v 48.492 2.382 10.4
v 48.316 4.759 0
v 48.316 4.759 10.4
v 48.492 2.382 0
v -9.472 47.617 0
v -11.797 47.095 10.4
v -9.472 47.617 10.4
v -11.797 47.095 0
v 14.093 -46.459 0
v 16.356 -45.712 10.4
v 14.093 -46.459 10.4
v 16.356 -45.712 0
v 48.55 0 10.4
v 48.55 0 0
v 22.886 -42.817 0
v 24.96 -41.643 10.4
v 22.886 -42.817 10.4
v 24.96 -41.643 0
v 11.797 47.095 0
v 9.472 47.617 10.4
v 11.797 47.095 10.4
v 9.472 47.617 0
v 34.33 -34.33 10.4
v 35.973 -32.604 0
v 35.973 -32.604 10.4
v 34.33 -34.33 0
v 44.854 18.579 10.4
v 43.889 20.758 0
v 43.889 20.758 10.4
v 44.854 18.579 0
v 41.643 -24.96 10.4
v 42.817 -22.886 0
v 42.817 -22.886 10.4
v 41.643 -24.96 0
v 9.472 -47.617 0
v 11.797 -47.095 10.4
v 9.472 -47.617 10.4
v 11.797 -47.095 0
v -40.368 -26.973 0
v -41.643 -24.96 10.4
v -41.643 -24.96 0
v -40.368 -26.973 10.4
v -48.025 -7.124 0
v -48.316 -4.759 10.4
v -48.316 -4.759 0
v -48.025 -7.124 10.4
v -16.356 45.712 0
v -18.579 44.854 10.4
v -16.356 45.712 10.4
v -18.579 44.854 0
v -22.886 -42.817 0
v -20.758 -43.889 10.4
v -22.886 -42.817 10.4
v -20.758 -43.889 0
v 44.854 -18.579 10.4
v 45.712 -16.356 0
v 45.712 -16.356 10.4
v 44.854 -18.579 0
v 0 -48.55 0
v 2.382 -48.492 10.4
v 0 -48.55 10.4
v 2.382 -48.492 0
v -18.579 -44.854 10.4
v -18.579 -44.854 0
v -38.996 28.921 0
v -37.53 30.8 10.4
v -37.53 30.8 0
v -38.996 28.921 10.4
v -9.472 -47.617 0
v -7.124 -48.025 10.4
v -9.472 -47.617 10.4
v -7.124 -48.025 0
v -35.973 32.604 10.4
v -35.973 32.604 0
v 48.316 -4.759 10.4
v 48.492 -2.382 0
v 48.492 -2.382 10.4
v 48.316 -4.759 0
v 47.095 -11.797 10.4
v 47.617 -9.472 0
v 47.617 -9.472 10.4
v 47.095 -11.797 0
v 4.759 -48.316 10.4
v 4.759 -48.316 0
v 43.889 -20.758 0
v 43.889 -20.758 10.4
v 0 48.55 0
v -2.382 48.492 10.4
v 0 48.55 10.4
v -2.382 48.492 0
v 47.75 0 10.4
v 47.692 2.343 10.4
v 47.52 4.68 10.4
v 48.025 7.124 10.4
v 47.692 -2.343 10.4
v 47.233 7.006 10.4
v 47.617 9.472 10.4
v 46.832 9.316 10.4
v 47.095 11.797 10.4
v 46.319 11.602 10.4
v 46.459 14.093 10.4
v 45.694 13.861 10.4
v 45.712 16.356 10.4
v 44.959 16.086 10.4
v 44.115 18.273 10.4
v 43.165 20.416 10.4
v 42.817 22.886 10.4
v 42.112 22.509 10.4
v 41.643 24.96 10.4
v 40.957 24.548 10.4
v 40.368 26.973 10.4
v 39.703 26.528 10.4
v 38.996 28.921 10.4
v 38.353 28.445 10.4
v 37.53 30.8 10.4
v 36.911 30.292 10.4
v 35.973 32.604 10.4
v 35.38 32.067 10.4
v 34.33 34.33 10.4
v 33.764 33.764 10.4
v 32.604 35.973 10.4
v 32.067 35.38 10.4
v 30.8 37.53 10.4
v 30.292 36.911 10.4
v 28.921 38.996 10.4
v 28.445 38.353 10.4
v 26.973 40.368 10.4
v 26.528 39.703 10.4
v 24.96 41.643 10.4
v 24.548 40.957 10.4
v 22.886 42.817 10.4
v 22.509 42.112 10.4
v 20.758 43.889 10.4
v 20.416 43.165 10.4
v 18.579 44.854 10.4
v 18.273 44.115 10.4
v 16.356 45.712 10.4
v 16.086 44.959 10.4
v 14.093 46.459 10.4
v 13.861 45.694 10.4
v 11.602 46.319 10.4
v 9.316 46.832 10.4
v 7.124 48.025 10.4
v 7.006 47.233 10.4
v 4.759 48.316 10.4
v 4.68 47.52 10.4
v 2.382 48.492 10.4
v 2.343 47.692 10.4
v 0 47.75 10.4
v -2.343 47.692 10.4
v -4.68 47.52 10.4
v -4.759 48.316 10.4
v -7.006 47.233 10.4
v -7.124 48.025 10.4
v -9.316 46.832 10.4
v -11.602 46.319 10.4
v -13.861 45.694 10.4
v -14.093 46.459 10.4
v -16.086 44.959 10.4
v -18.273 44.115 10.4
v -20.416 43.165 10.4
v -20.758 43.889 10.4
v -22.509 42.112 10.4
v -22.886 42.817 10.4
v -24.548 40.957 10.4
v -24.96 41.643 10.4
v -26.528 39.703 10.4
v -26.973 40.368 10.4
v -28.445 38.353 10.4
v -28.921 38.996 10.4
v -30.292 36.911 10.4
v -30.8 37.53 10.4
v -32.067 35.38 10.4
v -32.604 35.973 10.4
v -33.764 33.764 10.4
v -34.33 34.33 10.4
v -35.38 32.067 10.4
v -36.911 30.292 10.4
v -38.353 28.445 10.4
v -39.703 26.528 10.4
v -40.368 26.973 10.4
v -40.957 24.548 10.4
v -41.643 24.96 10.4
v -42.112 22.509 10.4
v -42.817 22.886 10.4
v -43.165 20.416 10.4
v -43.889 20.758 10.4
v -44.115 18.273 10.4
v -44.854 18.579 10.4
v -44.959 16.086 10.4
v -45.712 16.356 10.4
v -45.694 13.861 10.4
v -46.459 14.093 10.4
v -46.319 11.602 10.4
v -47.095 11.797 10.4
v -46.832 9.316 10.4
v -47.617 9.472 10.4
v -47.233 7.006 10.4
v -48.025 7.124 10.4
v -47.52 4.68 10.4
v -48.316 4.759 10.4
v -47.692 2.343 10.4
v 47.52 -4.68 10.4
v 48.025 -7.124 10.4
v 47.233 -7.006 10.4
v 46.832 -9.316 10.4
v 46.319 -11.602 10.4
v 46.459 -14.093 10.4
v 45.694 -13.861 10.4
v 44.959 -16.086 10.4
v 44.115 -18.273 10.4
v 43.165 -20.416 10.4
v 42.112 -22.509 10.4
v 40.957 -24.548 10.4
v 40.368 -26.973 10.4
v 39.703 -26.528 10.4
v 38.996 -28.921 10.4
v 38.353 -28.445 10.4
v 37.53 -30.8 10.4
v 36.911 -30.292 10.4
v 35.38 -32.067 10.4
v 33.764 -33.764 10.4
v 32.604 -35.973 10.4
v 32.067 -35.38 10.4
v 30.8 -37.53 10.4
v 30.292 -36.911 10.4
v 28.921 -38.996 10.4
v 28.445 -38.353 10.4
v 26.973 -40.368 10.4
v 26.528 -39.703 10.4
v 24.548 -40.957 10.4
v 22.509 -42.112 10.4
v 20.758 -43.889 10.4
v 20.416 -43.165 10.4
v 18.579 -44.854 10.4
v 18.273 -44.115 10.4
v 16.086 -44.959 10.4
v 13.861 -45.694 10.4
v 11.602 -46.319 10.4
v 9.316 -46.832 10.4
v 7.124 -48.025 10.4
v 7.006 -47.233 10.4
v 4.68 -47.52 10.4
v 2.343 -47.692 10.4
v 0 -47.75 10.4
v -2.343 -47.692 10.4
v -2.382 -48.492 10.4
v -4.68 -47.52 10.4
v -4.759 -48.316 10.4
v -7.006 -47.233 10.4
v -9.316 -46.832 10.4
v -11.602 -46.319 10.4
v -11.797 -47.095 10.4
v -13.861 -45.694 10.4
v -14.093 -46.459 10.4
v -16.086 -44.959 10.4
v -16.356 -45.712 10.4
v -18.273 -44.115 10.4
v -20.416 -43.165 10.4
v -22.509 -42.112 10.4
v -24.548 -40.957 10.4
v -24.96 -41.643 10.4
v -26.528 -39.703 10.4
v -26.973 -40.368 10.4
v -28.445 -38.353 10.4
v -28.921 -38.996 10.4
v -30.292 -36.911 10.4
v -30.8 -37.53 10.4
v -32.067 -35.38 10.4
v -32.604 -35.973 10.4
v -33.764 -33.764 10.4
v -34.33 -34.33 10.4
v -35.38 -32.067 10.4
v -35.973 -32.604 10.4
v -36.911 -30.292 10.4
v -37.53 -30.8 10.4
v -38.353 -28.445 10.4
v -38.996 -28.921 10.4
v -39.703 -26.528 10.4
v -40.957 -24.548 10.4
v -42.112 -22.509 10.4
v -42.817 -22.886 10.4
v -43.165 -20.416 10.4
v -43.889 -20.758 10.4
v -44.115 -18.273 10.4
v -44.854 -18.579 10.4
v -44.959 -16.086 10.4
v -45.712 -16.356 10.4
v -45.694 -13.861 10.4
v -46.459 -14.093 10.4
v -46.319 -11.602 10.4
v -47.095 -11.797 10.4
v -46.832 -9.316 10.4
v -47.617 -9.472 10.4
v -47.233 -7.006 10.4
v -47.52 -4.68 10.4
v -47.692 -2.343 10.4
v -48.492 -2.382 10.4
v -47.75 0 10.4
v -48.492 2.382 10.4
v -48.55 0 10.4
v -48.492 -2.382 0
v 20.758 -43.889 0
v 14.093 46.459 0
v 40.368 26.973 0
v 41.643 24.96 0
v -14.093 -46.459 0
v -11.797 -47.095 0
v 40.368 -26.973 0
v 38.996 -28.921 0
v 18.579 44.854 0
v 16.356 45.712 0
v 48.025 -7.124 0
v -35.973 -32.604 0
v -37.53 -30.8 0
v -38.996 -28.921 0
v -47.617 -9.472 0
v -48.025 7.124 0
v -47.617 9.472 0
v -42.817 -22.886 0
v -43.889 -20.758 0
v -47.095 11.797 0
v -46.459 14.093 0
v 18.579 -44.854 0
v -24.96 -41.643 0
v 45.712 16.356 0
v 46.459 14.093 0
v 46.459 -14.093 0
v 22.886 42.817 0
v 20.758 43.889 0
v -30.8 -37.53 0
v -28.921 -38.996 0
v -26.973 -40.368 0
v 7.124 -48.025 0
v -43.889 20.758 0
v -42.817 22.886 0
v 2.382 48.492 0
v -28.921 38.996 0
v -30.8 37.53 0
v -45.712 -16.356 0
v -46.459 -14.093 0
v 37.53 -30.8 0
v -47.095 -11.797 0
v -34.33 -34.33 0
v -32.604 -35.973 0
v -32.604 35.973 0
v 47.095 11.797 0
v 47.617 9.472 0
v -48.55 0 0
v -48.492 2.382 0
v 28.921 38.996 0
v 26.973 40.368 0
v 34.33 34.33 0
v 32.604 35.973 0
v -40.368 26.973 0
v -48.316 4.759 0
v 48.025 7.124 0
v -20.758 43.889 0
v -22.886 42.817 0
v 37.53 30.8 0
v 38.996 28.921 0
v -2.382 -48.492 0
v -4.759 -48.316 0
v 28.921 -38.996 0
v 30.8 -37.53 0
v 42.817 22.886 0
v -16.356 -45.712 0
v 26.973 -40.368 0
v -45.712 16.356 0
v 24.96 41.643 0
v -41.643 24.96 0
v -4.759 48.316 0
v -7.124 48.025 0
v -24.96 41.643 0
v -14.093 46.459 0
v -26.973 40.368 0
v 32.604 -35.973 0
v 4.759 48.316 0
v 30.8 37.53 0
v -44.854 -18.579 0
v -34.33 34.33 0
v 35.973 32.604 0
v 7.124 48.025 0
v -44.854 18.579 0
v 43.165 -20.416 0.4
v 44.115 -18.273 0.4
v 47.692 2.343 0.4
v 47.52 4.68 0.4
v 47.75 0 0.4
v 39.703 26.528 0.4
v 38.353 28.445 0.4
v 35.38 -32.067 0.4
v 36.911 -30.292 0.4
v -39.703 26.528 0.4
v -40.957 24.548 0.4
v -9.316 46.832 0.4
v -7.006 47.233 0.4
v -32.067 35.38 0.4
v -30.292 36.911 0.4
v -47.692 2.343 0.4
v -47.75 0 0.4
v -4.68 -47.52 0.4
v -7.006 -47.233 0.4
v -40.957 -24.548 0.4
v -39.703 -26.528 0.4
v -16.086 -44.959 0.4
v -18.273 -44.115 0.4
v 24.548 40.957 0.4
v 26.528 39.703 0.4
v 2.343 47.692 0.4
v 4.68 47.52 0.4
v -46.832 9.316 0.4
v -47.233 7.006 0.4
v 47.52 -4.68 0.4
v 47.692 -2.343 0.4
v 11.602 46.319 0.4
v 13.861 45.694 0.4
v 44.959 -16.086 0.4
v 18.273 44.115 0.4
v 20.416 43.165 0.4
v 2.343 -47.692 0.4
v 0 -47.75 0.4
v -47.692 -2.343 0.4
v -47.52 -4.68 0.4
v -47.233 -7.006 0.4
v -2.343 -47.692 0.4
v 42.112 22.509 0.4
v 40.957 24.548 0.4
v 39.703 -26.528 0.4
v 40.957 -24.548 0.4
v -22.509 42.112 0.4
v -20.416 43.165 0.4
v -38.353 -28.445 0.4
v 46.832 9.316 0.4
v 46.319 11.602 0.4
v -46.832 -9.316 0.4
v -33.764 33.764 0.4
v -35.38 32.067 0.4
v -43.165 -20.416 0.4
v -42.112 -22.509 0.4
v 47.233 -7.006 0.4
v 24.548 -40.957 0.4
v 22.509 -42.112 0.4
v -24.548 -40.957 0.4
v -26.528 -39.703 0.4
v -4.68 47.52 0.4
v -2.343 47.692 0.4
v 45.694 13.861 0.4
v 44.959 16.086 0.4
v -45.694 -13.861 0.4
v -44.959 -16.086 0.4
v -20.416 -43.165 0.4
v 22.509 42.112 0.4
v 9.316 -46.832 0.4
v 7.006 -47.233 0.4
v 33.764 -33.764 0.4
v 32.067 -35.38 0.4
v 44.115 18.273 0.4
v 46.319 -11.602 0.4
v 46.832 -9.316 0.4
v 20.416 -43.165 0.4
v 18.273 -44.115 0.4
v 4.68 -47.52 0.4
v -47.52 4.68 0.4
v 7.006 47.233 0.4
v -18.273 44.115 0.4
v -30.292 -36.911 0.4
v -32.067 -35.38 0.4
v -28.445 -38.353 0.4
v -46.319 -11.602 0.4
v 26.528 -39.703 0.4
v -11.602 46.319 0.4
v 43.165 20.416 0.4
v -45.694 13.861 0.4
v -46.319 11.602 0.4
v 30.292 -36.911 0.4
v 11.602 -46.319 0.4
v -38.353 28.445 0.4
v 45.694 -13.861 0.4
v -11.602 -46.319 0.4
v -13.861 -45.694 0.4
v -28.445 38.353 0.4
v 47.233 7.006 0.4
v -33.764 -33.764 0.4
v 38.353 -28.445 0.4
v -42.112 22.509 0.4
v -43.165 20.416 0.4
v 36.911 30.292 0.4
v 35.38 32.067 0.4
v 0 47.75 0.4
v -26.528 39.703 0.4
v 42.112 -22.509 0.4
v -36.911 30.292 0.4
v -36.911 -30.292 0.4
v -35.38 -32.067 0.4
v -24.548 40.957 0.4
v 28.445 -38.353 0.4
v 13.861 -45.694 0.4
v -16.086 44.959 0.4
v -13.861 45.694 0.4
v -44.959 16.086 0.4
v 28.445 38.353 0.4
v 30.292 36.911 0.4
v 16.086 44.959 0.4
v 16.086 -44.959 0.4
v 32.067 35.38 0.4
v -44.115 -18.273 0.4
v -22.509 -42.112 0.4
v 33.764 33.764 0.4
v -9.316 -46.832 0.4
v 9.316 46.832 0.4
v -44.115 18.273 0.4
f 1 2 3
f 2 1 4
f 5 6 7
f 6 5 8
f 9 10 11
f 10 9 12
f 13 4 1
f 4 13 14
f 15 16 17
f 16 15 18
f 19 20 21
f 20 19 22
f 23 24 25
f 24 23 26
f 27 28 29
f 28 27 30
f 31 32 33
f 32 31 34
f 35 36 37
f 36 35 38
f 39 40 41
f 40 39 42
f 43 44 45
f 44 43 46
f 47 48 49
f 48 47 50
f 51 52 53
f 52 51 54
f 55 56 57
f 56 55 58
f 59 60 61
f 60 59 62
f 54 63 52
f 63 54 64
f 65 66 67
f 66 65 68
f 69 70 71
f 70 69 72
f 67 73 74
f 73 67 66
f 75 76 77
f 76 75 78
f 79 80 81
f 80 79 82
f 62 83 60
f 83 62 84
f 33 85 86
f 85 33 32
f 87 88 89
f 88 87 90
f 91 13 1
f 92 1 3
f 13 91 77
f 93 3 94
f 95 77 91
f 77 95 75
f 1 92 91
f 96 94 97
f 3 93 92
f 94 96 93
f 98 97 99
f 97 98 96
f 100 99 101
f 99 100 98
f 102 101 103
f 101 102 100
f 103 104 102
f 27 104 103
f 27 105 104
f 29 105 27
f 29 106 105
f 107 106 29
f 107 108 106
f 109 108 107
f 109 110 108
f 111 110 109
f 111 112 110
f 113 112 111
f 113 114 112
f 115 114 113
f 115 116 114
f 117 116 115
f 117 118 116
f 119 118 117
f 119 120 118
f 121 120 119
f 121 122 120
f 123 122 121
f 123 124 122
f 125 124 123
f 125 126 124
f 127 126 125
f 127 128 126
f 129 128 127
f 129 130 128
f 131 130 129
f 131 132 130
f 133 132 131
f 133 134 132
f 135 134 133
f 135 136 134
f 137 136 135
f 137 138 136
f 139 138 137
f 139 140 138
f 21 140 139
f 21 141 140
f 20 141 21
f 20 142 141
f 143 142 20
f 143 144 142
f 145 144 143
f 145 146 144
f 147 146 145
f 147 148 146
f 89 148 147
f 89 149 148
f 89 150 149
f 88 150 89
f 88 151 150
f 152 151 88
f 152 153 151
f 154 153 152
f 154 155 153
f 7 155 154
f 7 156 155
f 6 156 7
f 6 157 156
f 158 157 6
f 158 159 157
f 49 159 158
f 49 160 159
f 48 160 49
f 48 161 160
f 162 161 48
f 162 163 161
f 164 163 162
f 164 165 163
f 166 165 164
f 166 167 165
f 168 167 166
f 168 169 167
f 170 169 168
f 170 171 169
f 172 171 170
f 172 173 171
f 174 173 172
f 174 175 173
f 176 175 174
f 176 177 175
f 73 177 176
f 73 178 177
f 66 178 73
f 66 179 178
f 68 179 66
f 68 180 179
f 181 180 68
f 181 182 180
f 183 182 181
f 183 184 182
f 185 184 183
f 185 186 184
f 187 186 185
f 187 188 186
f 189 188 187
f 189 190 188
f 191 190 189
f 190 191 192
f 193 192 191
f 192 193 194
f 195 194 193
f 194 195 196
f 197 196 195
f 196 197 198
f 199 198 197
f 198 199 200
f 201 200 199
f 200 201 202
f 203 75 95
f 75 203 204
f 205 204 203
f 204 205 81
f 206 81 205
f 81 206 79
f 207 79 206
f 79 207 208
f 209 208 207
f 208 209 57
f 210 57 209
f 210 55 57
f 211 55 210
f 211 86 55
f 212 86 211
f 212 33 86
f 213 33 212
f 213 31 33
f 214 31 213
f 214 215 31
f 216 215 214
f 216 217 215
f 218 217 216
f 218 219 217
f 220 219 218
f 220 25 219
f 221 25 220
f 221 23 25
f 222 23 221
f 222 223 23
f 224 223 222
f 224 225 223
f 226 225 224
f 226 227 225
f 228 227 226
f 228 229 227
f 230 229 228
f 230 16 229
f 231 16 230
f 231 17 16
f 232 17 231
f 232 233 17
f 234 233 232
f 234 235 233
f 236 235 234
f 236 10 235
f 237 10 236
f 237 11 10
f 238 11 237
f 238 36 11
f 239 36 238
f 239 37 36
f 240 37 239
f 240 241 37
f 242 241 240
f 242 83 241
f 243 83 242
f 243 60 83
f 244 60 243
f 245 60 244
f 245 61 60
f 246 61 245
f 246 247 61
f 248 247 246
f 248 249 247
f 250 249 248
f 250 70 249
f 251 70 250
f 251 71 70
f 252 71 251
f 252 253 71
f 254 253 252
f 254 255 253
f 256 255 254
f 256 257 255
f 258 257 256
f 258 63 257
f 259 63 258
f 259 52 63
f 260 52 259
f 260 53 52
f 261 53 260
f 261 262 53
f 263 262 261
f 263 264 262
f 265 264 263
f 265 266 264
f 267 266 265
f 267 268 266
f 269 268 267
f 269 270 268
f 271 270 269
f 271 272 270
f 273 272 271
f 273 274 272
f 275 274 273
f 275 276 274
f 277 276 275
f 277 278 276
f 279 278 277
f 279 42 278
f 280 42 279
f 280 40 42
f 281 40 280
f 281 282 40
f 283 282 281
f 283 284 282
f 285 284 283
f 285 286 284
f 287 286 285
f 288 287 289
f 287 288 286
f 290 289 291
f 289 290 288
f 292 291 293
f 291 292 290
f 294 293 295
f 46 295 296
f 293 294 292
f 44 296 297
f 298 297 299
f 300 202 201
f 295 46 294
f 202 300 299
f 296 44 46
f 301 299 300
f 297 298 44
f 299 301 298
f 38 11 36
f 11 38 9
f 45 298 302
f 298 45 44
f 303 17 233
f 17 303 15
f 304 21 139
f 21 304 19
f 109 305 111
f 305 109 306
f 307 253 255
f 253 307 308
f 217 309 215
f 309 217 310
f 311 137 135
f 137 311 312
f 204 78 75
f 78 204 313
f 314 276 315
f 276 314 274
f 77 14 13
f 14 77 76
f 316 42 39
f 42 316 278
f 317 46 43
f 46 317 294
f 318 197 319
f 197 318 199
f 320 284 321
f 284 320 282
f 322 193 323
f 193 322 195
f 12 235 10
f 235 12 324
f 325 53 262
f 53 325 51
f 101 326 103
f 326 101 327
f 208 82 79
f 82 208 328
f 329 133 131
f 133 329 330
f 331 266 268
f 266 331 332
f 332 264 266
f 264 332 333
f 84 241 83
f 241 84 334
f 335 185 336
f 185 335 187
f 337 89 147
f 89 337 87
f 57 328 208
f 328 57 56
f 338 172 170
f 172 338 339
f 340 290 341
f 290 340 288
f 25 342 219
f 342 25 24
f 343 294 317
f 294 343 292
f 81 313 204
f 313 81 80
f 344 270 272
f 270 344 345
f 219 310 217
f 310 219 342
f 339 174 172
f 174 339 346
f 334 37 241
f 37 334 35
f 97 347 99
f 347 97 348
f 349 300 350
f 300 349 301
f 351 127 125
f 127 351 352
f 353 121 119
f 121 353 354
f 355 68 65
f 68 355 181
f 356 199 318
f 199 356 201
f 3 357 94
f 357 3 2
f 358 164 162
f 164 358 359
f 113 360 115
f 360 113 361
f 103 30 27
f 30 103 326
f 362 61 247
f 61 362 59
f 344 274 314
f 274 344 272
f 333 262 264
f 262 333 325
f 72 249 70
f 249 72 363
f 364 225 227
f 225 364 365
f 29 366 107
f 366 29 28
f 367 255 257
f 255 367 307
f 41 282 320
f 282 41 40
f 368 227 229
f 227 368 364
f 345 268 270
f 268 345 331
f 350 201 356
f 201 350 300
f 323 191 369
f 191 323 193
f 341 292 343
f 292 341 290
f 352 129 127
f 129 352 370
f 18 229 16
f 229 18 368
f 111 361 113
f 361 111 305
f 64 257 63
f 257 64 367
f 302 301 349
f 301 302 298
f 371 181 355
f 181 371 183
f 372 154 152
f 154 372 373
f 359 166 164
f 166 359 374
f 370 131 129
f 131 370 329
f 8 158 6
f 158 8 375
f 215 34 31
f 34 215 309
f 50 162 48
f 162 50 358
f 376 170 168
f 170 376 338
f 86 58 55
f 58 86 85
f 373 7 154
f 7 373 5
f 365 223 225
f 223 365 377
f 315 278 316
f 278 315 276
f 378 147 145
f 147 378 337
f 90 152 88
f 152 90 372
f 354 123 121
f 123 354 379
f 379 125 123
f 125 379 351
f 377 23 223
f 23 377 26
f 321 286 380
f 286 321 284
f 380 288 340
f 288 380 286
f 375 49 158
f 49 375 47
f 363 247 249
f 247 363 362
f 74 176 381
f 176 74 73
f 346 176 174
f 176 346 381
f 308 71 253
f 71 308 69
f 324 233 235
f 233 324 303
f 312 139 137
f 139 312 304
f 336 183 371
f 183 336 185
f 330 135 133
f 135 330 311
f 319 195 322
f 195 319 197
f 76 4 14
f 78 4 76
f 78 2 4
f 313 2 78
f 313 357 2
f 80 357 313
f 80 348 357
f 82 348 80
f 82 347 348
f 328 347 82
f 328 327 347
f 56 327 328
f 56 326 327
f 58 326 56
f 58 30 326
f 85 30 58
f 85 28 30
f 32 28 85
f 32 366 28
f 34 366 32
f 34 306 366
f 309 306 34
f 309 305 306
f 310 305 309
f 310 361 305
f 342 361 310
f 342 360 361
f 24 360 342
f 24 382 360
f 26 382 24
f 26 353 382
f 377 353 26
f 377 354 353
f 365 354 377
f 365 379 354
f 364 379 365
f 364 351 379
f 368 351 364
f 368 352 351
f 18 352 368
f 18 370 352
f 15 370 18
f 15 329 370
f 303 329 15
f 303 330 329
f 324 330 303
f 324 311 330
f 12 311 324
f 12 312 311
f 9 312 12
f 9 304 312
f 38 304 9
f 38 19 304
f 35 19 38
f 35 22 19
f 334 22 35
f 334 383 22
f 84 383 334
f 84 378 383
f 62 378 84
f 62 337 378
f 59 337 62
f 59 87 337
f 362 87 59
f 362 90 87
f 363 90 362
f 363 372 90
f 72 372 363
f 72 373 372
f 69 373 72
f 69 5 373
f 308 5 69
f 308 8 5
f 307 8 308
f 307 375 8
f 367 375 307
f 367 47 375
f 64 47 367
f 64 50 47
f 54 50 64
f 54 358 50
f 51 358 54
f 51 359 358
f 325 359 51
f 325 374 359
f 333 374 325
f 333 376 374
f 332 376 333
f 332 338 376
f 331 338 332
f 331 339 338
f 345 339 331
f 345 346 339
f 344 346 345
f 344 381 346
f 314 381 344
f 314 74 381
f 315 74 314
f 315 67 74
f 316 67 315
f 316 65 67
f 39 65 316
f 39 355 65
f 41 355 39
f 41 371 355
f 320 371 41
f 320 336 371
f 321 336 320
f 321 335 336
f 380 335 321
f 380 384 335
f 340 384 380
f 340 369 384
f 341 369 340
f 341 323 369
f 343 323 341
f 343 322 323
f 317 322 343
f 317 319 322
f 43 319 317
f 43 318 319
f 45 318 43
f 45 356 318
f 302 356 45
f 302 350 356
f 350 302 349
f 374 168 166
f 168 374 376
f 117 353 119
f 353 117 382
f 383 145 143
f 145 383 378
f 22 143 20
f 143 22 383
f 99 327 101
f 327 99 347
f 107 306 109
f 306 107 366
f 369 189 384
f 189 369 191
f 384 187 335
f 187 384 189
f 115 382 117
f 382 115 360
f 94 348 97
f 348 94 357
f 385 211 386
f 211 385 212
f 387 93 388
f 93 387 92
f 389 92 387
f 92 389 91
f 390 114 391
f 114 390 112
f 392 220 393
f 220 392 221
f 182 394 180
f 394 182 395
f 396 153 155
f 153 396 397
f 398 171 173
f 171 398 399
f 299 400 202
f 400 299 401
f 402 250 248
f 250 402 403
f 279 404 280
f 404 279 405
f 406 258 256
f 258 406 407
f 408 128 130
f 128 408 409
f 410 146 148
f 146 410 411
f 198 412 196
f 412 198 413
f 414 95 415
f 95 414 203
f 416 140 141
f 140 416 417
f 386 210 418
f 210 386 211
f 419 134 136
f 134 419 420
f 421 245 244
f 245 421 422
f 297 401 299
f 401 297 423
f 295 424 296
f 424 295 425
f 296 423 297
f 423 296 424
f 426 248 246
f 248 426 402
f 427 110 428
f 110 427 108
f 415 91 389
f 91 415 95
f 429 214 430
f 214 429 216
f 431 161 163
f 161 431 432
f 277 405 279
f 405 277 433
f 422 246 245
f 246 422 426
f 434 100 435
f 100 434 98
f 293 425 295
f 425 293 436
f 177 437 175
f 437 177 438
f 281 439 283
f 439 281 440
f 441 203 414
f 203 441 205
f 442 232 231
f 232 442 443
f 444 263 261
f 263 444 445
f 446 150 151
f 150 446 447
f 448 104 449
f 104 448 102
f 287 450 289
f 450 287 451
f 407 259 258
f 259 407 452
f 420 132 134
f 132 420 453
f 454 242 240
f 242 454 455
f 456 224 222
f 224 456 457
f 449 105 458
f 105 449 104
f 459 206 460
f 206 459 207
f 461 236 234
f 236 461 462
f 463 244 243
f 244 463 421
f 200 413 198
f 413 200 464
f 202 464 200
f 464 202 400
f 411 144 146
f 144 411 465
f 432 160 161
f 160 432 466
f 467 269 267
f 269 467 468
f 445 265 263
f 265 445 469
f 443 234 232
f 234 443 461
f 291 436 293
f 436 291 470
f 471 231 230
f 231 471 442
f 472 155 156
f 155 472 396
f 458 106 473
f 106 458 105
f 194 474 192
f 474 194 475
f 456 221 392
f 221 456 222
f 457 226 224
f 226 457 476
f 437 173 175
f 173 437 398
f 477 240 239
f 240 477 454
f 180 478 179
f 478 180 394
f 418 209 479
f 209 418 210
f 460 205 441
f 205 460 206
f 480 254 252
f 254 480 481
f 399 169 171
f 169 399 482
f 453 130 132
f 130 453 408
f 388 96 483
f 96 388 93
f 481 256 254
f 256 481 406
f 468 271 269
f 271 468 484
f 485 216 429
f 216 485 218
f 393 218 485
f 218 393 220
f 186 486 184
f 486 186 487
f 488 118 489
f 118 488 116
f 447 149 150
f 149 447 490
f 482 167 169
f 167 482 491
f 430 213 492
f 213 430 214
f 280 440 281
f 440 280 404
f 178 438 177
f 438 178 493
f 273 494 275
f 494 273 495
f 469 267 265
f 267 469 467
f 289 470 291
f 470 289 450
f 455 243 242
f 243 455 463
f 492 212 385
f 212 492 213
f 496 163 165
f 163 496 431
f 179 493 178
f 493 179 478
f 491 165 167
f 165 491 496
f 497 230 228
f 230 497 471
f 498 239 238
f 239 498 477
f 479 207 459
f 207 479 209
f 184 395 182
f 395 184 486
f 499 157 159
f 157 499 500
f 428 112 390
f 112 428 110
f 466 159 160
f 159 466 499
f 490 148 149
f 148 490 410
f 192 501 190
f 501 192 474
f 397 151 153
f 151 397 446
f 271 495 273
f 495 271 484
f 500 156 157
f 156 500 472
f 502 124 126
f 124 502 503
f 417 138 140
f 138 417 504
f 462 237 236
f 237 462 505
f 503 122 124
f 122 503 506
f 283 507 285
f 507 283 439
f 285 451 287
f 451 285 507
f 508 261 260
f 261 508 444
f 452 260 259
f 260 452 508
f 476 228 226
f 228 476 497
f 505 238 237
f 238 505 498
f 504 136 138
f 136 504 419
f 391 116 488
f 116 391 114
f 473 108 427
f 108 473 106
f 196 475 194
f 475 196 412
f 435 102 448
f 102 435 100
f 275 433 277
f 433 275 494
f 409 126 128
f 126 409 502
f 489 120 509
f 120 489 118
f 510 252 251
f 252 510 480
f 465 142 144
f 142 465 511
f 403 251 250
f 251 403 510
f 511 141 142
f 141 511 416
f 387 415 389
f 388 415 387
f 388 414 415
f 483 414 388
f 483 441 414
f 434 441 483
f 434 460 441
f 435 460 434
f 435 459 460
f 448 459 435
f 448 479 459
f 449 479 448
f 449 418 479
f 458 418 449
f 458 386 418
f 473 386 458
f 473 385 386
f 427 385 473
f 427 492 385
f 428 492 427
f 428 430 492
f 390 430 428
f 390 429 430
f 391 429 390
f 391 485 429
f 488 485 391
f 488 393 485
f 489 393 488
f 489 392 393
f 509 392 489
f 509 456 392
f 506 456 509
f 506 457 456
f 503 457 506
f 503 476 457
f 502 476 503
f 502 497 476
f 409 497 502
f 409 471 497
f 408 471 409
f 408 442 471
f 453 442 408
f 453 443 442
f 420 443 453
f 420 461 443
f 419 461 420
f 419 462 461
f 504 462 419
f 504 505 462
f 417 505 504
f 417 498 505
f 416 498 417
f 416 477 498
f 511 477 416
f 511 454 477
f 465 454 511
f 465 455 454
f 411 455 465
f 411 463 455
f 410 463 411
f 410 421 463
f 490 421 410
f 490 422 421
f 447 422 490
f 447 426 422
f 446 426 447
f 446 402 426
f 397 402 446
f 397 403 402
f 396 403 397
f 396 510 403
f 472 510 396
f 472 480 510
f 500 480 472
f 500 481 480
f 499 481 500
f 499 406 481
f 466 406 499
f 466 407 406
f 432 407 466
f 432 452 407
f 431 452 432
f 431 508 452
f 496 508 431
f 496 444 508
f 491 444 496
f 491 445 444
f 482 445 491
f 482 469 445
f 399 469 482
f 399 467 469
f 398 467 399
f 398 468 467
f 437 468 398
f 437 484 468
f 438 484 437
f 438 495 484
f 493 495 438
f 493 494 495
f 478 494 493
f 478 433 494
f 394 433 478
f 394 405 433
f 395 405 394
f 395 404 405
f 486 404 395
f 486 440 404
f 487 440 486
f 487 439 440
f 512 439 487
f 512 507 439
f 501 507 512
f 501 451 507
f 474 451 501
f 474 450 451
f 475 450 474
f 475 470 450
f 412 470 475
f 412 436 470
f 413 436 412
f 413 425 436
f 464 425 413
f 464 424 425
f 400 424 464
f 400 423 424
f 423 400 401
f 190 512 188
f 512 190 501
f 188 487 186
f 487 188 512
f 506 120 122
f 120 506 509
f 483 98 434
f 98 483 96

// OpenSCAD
$fn = 128;
r = 95.50 / 2;
w = 0.4 * 2;

difference() {
    linear_extrude(10.4)
        circle(r + w);
    
    translate([0, 0, 0.4])
        linear_extrude(10.4)
            circle(r);
}
